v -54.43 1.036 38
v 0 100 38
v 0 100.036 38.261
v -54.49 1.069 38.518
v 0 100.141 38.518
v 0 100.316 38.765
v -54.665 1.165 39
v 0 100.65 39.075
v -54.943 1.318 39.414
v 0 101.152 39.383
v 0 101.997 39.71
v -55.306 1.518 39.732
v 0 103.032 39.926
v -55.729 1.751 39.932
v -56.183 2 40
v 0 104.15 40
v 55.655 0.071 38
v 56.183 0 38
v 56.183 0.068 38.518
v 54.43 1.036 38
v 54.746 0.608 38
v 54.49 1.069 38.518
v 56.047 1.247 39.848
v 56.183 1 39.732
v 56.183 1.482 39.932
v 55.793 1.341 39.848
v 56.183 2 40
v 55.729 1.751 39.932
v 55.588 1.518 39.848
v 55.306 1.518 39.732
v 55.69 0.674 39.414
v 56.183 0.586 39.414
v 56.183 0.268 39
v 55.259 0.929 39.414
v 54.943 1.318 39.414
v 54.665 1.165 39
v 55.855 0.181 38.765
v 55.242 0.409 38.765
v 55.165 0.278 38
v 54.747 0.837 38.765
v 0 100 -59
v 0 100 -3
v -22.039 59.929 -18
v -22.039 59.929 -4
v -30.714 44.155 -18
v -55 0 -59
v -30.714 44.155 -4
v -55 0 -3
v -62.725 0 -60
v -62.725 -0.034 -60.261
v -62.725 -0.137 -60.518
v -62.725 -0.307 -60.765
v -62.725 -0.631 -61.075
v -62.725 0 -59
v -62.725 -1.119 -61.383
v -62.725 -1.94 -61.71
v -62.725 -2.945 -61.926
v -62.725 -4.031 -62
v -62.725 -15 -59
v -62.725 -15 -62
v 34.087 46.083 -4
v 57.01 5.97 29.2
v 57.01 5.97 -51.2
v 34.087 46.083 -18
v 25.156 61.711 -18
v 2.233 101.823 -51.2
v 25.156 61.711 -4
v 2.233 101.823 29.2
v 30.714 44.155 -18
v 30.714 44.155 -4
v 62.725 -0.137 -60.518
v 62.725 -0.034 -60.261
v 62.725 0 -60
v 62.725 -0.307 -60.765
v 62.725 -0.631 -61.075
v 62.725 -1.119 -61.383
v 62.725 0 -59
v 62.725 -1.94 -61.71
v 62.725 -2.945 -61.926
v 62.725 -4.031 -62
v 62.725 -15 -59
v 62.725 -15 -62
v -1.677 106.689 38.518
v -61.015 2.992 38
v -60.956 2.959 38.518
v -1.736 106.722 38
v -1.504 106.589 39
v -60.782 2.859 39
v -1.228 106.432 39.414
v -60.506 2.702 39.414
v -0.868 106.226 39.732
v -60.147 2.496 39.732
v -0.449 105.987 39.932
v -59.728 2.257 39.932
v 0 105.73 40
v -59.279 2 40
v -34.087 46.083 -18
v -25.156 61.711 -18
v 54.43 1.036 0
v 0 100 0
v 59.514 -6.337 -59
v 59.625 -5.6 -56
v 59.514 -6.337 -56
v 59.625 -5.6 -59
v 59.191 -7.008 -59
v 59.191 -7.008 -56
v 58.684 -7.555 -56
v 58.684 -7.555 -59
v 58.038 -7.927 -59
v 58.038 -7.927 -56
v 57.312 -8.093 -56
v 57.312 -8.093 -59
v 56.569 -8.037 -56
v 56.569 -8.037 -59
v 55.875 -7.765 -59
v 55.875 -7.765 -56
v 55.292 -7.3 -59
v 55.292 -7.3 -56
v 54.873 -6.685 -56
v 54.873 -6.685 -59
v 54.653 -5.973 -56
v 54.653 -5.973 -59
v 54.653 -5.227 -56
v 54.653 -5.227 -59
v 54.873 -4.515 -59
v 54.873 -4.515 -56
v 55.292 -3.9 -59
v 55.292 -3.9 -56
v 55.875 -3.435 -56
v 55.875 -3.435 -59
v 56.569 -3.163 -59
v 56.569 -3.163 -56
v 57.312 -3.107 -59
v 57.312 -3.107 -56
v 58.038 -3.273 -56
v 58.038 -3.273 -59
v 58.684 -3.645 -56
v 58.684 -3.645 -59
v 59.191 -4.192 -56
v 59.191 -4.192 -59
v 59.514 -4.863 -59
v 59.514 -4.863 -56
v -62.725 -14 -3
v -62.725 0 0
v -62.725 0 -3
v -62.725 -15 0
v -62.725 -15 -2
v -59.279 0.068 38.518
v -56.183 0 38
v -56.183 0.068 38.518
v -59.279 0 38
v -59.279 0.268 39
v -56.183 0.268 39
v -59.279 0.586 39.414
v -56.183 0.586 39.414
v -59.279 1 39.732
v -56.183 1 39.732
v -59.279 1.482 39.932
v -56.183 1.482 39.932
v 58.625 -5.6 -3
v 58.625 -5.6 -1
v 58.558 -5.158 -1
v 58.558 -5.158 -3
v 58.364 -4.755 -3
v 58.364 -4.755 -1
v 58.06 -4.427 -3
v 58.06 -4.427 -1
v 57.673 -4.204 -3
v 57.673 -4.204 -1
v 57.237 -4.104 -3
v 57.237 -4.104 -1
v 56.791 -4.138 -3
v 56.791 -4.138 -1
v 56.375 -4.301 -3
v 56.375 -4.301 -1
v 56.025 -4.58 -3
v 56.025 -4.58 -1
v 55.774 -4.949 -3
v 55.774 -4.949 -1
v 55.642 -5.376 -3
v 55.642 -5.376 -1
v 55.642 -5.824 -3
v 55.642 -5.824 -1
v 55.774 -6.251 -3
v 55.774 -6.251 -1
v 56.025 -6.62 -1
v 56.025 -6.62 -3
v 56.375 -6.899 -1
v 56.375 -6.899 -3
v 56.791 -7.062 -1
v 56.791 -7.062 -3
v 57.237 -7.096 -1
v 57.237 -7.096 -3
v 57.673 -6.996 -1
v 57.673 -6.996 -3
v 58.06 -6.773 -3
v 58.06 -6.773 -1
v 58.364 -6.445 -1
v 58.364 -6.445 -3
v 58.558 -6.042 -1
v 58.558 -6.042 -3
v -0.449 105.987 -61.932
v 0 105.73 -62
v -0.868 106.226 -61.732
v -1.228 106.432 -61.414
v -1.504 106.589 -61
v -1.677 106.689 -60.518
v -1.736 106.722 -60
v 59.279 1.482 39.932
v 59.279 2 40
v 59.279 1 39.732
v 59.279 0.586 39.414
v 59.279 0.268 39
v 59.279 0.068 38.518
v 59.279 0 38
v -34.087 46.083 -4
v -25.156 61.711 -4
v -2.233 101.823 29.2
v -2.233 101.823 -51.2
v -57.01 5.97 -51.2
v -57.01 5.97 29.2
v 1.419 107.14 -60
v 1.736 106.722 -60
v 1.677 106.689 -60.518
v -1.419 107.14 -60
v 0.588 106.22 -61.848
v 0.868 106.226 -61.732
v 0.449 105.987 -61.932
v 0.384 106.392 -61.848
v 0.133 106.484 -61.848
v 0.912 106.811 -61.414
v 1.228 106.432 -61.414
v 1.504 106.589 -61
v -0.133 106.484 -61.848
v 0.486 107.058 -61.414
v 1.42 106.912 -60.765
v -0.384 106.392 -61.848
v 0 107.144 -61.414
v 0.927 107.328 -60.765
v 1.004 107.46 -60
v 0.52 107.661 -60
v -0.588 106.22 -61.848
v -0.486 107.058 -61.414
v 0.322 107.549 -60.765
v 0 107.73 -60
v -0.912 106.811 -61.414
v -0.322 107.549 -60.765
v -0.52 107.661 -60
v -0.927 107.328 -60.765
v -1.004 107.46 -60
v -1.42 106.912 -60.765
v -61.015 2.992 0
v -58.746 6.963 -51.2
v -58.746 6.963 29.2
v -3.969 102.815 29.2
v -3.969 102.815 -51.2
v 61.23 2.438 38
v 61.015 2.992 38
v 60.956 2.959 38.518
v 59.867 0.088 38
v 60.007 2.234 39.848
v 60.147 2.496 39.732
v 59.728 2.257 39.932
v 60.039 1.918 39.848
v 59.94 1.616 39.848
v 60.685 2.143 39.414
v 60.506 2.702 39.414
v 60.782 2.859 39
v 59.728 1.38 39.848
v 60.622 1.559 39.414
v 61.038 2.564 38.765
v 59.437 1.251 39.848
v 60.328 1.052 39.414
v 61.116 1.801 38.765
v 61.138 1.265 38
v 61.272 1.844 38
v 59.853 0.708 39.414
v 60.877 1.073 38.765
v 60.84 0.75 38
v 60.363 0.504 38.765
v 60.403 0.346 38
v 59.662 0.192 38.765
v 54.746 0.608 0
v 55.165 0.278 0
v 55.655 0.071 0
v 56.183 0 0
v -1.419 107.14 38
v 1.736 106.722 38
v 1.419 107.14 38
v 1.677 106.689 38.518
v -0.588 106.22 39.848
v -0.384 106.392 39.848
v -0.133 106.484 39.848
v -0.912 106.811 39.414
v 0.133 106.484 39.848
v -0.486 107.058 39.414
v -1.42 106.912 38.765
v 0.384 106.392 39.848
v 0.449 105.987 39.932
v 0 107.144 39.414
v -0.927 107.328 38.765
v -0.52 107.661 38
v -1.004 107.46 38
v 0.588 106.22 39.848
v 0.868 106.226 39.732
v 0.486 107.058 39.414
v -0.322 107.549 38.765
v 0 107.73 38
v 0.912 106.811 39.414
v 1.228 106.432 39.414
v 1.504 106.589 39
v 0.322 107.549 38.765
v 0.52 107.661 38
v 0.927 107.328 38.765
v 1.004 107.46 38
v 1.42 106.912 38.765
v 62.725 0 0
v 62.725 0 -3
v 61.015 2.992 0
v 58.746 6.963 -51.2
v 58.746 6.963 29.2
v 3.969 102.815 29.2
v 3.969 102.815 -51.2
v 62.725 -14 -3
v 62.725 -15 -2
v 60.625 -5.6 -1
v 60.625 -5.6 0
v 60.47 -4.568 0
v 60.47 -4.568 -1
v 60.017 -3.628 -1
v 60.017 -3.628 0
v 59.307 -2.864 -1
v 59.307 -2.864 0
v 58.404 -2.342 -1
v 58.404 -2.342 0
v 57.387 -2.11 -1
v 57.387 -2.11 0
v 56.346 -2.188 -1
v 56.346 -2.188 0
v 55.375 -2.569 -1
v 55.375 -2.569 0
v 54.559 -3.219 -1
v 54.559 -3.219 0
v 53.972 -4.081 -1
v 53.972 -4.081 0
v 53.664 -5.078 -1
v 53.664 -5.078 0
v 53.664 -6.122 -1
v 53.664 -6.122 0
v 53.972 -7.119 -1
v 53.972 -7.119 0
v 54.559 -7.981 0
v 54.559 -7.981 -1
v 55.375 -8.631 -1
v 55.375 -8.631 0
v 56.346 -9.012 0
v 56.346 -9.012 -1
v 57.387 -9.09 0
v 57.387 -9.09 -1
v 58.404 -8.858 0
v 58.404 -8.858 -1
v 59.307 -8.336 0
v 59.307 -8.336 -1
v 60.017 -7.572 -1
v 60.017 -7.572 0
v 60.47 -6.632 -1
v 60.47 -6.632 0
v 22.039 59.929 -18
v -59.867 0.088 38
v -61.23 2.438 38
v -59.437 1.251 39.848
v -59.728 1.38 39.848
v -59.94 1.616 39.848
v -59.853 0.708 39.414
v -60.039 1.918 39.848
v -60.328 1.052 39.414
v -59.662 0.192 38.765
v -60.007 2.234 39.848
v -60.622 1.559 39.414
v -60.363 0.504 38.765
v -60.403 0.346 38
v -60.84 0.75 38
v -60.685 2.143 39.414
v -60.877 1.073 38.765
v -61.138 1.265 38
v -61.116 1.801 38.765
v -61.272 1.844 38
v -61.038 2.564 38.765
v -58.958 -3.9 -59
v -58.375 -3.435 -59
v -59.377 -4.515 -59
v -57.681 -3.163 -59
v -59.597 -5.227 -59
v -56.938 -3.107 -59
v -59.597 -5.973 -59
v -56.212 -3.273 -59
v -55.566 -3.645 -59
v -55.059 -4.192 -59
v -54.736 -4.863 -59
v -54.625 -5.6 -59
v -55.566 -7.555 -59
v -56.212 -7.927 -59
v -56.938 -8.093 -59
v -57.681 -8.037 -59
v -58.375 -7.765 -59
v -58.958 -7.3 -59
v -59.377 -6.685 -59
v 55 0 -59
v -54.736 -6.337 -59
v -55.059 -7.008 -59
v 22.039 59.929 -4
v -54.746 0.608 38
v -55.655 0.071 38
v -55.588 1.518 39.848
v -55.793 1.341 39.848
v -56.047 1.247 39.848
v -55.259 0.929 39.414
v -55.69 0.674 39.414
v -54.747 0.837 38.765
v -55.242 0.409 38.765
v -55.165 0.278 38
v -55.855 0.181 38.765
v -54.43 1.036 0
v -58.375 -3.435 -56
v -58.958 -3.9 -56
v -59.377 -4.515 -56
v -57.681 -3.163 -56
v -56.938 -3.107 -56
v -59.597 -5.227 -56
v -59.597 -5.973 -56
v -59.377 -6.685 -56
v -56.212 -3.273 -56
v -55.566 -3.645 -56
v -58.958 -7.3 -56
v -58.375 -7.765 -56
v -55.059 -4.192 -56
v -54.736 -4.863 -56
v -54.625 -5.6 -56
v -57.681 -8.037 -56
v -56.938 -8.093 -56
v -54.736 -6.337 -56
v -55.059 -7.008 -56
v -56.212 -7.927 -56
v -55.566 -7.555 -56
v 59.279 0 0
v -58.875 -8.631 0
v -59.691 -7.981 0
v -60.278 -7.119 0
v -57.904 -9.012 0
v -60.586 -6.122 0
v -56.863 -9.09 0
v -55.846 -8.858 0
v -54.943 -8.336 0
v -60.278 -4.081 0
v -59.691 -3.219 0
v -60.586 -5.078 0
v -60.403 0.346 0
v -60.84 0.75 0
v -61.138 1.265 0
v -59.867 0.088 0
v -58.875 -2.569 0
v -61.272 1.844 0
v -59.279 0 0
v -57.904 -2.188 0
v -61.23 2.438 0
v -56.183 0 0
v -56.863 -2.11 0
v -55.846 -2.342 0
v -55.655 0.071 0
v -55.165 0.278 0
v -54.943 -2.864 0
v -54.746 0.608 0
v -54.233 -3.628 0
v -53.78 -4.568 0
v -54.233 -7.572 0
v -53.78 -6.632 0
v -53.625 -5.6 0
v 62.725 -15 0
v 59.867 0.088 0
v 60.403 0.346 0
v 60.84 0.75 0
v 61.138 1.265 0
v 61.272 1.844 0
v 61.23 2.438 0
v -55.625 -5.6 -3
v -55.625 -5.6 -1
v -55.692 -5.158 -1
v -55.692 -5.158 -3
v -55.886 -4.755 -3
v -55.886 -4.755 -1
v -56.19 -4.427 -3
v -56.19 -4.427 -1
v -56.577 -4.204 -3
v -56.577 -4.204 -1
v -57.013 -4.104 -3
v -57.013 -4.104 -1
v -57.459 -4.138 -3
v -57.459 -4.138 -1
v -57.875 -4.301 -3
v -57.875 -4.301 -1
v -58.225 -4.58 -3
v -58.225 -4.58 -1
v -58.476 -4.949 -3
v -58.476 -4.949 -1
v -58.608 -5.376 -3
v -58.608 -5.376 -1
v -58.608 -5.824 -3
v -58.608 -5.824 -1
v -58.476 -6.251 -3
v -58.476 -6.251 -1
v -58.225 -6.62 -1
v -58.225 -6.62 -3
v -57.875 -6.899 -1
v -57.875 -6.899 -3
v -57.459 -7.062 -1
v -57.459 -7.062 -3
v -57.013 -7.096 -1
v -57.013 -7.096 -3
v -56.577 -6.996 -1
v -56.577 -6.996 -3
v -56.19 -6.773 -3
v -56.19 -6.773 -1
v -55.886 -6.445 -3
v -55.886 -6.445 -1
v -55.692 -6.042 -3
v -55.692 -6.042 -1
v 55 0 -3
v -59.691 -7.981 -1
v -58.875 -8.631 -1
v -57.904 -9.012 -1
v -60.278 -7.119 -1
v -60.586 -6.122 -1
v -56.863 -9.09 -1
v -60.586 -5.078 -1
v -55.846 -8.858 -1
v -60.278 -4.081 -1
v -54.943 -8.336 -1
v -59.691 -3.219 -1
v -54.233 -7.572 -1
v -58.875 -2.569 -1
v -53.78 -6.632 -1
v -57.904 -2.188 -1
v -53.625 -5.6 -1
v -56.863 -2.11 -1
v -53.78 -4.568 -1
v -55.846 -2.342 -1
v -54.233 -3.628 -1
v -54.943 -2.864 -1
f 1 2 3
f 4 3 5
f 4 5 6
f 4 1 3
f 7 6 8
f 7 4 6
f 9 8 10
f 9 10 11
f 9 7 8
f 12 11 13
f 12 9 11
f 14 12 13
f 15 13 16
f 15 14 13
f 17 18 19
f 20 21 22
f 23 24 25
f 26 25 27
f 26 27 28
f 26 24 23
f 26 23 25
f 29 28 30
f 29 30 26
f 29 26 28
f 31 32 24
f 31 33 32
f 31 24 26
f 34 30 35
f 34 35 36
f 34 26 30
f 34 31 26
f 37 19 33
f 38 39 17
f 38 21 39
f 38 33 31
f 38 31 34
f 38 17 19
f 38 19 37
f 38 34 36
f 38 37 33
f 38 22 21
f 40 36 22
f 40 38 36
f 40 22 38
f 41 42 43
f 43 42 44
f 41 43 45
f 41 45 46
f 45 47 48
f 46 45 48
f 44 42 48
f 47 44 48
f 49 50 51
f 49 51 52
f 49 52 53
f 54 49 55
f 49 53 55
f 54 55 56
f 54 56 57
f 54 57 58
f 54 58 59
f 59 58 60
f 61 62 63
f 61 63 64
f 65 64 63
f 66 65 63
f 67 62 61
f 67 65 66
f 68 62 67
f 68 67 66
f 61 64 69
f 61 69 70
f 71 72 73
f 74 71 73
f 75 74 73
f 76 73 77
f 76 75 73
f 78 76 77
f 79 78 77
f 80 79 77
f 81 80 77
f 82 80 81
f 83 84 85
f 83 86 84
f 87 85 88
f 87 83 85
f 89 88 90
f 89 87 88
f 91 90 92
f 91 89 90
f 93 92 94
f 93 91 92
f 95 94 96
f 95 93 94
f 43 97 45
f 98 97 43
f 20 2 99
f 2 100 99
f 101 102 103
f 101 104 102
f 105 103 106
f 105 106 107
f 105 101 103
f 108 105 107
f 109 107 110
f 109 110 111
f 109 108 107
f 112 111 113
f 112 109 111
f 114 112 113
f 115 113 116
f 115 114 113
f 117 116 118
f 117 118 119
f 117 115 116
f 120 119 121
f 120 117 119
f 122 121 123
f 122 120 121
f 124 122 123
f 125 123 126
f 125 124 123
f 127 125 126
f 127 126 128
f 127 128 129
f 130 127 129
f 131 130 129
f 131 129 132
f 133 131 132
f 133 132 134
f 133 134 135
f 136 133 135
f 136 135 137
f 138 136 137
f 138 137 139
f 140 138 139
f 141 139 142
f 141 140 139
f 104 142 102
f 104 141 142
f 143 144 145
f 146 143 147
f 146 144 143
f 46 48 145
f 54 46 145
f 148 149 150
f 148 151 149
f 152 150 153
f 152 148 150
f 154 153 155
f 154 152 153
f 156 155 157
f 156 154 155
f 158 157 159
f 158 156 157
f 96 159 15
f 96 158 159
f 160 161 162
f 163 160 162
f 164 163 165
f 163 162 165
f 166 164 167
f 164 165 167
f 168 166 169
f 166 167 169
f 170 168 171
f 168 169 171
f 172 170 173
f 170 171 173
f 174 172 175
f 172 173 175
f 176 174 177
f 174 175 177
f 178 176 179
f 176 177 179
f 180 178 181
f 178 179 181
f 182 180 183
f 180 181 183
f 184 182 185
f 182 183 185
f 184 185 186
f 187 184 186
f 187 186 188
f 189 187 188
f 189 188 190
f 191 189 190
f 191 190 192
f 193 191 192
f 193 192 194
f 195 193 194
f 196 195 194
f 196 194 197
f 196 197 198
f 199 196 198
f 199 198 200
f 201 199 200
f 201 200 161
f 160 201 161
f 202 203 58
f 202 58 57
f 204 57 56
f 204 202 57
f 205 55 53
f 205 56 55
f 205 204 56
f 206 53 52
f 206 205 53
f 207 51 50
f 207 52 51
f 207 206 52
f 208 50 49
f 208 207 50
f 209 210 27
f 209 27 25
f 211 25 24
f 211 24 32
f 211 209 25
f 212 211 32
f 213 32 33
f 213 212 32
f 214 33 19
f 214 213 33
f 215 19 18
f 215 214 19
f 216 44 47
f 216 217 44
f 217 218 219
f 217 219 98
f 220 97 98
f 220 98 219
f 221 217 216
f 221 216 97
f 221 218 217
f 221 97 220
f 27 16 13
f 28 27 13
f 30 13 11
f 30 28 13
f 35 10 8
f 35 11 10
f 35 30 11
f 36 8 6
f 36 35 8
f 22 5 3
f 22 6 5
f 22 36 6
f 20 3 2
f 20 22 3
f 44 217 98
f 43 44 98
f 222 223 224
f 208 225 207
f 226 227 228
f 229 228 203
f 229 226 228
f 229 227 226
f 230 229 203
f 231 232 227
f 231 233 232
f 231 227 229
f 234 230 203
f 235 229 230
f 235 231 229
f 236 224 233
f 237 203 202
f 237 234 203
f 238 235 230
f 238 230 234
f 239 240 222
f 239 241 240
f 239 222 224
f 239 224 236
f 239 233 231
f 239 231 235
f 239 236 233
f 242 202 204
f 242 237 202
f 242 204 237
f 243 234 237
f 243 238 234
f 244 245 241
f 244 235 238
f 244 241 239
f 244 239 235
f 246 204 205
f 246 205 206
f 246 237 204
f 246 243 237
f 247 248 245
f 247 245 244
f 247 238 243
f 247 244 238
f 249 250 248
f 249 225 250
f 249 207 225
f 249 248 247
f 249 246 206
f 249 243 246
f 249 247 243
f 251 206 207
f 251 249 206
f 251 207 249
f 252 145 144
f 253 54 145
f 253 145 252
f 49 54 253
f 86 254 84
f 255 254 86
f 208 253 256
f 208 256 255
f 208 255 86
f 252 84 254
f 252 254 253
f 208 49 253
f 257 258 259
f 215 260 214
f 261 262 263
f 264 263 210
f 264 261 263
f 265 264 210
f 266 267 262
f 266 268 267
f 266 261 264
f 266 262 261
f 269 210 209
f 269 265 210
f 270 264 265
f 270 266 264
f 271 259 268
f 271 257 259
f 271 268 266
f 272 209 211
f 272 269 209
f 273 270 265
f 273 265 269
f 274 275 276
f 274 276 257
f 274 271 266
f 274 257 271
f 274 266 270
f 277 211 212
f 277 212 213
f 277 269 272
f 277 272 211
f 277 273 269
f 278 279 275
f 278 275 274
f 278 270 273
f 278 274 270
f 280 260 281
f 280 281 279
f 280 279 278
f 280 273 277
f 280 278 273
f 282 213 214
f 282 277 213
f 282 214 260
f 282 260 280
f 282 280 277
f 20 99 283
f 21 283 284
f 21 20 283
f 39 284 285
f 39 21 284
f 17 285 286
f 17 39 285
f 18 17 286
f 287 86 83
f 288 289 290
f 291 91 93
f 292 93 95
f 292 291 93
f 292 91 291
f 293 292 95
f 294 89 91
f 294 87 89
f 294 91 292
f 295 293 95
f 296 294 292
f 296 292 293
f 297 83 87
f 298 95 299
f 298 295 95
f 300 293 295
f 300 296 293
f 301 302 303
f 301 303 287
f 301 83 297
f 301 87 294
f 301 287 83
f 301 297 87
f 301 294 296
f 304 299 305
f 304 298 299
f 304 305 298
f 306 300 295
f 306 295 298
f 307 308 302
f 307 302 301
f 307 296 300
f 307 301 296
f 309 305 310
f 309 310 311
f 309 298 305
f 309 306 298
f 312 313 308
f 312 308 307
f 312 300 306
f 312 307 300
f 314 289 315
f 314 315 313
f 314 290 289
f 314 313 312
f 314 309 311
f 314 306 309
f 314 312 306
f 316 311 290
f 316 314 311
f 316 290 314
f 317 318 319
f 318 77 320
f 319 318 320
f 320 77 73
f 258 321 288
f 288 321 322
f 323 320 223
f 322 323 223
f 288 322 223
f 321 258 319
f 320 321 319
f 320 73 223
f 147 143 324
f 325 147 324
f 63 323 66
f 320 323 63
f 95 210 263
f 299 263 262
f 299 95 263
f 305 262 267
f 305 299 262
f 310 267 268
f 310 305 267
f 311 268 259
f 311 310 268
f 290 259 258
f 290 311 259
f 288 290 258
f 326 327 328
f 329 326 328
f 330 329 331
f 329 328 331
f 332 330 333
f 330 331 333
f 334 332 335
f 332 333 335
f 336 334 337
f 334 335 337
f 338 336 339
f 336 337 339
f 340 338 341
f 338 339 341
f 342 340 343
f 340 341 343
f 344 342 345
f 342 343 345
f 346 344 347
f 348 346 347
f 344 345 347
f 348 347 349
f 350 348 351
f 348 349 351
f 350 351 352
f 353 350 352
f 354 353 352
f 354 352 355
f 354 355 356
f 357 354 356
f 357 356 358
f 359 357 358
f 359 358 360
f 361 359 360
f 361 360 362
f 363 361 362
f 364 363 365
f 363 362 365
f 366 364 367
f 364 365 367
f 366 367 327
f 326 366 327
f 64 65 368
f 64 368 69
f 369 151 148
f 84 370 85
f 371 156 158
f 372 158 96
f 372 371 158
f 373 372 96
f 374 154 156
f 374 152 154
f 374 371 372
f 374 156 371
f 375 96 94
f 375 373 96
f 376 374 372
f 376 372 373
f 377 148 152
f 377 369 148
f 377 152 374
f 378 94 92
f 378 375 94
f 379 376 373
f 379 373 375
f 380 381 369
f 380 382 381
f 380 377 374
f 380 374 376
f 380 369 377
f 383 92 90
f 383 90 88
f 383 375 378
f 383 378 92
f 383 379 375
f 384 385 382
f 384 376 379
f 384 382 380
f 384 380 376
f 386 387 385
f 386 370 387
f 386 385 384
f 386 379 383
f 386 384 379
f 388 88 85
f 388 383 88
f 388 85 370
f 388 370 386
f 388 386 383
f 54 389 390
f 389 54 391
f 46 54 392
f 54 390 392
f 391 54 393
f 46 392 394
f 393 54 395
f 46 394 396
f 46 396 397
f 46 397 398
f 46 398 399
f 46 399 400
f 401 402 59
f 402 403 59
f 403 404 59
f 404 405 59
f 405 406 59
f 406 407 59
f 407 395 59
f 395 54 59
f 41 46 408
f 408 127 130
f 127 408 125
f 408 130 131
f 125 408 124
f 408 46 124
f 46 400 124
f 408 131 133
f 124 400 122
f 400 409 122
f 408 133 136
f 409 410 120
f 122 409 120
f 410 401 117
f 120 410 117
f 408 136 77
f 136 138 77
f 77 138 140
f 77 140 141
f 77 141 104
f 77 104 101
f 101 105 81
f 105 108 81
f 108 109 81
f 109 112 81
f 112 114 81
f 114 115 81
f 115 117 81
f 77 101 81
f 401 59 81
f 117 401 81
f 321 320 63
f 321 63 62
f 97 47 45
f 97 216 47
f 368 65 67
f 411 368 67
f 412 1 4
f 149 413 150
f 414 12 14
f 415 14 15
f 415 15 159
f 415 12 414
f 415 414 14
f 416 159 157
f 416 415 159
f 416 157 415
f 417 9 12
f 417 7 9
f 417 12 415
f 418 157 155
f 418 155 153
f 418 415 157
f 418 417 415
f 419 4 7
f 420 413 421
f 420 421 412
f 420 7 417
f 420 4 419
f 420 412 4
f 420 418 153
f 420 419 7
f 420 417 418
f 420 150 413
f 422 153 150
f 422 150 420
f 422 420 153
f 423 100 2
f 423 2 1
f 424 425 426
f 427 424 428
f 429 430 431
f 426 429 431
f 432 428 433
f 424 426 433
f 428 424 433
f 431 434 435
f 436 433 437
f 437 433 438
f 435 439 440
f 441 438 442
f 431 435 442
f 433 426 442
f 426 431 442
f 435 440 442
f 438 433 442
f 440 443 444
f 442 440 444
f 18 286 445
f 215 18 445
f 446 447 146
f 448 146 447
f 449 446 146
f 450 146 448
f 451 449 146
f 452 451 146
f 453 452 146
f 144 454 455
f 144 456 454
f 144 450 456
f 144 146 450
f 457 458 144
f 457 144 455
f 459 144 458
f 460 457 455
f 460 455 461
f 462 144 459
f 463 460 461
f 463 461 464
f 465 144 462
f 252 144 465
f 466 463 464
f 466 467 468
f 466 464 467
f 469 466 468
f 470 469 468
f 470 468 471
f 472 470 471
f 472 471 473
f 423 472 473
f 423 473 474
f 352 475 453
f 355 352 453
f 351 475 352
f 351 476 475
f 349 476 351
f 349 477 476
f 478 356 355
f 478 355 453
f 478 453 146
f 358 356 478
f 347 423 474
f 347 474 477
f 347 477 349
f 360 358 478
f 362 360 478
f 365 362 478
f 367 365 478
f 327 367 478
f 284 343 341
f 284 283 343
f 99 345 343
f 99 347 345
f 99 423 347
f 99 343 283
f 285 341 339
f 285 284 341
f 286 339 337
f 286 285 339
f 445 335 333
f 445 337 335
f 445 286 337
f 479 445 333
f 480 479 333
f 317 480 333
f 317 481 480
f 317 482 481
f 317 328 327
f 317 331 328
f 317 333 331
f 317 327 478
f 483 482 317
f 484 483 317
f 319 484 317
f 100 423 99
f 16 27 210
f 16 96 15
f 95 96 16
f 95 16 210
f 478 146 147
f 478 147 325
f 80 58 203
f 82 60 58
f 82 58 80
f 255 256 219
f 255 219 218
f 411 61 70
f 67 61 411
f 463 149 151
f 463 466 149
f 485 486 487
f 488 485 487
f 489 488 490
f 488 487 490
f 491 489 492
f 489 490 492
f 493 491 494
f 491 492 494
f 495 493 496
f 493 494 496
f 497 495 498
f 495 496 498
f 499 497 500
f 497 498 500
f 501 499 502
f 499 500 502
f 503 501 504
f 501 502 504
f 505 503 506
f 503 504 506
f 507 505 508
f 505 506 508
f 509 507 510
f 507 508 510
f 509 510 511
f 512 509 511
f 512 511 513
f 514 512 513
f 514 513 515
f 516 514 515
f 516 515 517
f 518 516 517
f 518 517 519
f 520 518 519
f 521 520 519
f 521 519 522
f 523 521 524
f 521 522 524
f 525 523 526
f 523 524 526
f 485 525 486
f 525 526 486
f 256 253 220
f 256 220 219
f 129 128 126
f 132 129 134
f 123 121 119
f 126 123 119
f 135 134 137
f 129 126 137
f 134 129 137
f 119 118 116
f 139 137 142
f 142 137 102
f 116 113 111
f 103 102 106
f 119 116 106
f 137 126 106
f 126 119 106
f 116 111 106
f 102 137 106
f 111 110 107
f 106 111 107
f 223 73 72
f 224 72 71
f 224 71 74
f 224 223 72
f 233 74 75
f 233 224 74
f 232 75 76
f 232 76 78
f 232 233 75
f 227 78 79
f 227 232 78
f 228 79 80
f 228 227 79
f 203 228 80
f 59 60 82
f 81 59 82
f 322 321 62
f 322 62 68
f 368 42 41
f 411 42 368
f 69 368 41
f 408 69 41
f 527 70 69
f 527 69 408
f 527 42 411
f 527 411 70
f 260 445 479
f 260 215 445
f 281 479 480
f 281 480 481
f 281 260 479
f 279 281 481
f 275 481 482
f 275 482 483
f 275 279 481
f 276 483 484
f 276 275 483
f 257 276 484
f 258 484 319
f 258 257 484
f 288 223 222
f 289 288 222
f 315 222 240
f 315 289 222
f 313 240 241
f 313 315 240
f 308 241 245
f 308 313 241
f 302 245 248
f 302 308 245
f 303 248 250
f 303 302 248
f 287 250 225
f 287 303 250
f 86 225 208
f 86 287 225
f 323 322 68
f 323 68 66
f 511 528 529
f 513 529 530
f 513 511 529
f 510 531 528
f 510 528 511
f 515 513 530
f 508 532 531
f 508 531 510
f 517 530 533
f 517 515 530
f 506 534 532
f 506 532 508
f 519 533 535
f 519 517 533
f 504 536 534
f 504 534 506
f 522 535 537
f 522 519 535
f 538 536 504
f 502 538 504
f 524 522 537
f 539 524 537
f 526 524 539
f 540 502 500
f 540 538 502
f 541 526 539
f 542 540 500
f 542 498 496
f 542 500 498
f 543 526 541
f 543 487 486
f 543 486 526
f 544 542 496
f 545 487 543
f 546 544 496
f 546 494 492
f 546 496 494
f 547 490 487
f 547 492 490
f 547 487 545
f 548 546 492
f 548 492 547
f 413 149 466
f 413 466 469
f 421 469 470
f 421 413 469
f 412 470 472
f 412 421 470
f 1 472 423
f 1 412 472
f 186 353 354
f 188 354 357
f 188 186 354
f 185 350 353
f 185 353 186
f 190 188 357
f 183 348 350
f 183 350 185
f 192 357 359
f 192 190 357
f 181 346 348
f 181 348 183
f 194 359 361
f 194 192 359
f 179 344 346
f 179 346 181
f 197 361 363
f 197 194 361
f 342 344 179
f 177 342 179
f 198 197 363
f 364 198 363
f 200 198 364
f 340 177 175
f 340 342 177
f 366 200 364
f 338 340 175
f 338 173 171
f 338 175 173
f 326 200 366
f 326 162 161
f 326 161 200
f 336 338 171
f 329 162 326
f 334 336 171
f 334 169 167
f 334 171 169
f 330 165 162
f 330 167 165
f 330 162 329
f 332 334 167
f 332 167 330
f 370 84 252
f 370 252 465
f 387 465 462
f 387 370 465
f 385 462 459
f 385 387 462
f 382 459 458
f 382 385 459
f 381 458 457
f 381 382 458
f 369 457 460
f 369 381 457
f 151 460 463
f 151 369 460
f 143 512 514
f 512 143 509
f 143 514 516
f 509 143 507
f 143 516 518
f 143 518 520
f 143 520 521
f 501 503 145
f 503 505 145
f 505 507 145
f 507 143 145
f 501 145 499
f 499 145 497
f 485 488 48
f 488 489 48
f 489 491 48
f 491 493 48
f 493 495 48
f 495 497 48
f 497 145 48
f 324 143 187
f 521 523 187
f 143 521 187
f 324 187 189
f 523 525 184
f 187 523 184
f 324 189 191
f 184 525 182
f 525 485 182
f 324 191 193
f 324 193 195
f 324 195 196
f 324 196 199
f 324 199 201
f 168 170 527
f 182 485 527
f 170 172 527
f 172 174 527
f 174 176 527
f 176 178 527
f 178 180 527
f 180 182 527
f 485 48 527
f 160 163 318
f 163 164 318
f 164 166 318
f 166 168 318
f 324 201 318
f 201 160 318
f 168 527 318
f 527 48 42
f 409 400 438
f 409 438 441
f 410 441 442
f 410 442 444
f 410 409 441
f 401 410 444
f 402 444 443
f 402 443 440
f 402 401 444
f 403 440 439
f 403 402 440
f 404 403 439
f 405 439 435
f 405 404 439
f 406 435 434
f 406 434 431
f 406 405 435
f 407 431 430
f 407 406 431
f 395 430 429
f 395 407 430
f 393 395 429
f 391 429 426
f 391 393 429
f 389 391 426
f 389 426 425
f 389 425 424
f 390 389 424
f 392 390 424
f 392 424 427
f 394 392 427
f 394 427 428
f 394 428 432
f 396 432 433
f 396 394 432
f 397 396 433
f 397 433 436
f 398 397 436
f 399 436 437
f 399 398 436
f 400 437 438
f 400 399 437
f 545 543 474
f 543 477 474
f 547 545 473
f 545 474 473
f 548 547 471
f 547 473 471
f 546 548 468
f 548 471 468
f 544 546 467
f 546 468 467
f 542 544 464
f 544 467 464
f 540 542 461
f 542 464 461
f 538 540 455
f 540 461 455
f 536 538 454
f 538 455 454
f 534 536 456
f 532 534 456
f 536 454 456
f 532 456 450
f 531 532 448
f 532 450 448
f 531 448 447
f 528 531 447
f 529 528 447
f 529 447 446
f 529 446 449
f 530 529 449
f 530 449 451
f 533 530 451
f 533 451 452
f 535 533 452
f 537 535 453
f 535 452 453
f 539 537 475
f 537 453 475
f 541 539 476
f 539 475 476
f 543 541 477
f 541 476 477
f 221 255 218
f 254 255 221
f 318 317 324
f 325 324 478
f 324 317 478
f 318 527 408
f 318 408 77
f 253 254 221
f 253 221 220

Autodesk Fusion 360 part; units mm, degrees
sketch "Sketch1" plane through (0, 0, 0) normal (0, 0, 1) x (1, 0, 0)
  line L0 (0, 0) -> (62.725, 0)
  line L1 (0, 0) -> (-62.725, 0)
  line L2 (62.725, 0) -> (62.725, -15)
  circle A0 centre (-57.125, -5.6) radius 1.5
  line L3 (-62.725, 0) -> (-62.725, -15)
  line L4 (-62.725, -15) -> (62.725, -15)
  circle A1 centre (57.125, -5.6) radius 1.5
  line L5 (0, 0) -> (0, 109.7609) construction
  line L6 (-62.725, 0) -> (0, 109.7609)
  line L7 (62.725, 0) -> (0, 109.7609)
  line L8 (0, 109.7609) -> (0, 100)
  line L9 (0, 100) -> (-55, 0)
  line L10 (0, 100) -> (55, 0)
  circle A2 centre (-57.125, -5.6) radius 3.5
  circle A3 centre (57.125, -5.6) radius 3.5
  dimension "d1" = 62.725
  dimension "d2" = 62.725
  dimension "d3" = 15
  dimension "d8" = 3
  dimension "d9" = 15
  dimension "d12" = 3
  dimension "d33" = 2
  dimension "d34" = 2
extrude "Extrude1" add sketch "Sketch1" against normal blind 3 contours L0 L1 L2 L3 L4 | A2 | A3 makes body 1
extrude "Extrude2" add sketch "Sketch1" against normal blind 62 separate body contours L0 L7 L8 L10 | L1 L6 L8 L9 makes body 2
extrude "Extrude3" add sketch "Sketch1" against normal blind 3 contours L0 L1 L9 L10 bodies 1 2
sketch "Sketch2" plane through (0, 0, -62) normal (0, 0, -1) x (1, 0, 0)
  line L0 (0, -100) -> (-55, 0)
  line L1 (-55, 0) -> (-62.725, 0)
  line L2 (-62.725, 0) -> (0, -109.7609)
  line L3 (0, -109.7609) -> (62.725, 0)
  line L4 (55, 0) -> (0, -100)
  line L5 (0, 0) -> (-62.725, 0)
  line L6 (0, 0) -> (62.725, 0)
  line L7 (62.725, 0) -> (62.725, 15)
  line L8 (-62.725, 0) -> (-62.725, 15)
  line L9 (-62.725, 15) -> (62.725, 15)
  line L10 (62.725, 0) -> (55, 0)
  circle A0 centre (57.125, 5.6) radius 2.5
  circle A1 centre (-57.125, 5.6) radius 2.5
  dimension "d23" = 5
  dimension "d24" = 5.6
  dimension "d25" = 5.6
  dimension "d26" = 5
  dimension "d27" = 5.6
  dimension "d28" = 5.6
extrude "Extrude4" add sketch "Sketch2" against normal blind 3 separate body contours L1 L5 L6 L7 L8 L9 L10 | A0 | A1 makes body 3
extrude "Extrude5" add sketch "Sketch2" against normal blind 3 contours L0 L4 L5 L6 bodies 1 3
extrude "Extrude6" add sketch "Sketch2" against normal blind 6 contours A0 | A1 bodies 1
extrude "Extrude7" cut sketch "Sketch1" against normal blind 1 contours A2 | A3 bodies 1
chamfer "Chamfer1" distance 1 angle 45 1 edges at (0, -15, -3) on bodies 1
extrude "Extrude8" add sketch "Sketch1" along normal blind 40 contours L0 L7 L8 L10 | L1 L6 L8 L9 bodies 1
sketch "Sketch3" plane through (-47.2833, 27.021, 0) normal (-0.868228, 0.496166, 0) x (-0.496166, -0.868228, 0)
  line L0 (-95.2975, 40) -> (-95.2975, -62)
  line L1 (-95.2975, -62) -> (31.122, -62)
  line L2 (31.122, -62) -> (31.122, -59)
  line L3 (31.122, -59) -> (31.122, -3)
  line L4 (31.122, -3) -> (31.122, 0)
  line L5 (31.122, 0) -> (31.122, 40)
  line L6 (31.122, 40) -> (-95.2975, 40)
  line L7 (-87.0975, 29) -> (22.9025, 29) construction
  line L8 (22.9025, 29) -> (22.9025, -51) construction
  line L9 (22.9025, -51) -> (-87.0975, -51) construction
  line L10 (-87.0975, -51) -> (-87.0975, 29) construction
  line L11 (23.5025, -51.6) -> (-87.6975, -51.6) construction
  line L12 (-87.6975, -51.6) -> (-87.6975, 29.6) construction
  line L13 (-87.6975, 29.6) -> (23.5025, 29.6) construction
  line L14 (23.5025, 29.6) -> (23.5025, -51.6) construction
  line L15 (-54.0975, -4) -> (-10.0975, -4)
  line L16 (-10.0975, -4) -> (-10.0975, -18)
  line L17 (-10.0975, -18) -> (-54.0975, -18)
  line L18 (-54.0975, -18) -> (-54.0975, -4)
  line L19 (-87.2975, 29.2) -> (23.1025, 29.2)
  line L20 (23.1025, 29.2) -> (23.1025, -51.2)
  line L21 (23.1025, -51.2) -> (-87.2975, -51.2)
  line L22 (-87.2975, -51.2) -> (-87.2975, 29.2)
  line L23 (-41.0975, -4) -> (-41.0975, -18)
  line L24 (-23.0975, -4) -> (-23.0975, -18)
  line L25 (-23.0975, -18) -> (-41.0975, -18)
  line L26 (-23.0975, -4) -> (-41.0975, -4)
  dimension "d40" = 110
  dimension "d41" = 80
  dimension "d42" = 11
  dimension "d43" = 8.2
  dimension "d44" = -0.6
  dimension "d55" = 33
  dimension "d66" = -0.2
  dimension "d67" = 13
  dimension "d68" = 13
extrude "Extrude12" cut sketch "Sketch3" against normal blind 2 contours L15 L17 L18 L23 | L15 L17 L23 L24 L25 L26 | L15 L16 L17 L24 | L19 L20 L21 L22 bodies 1
extrude "Extrude13" cut sketch "Sketch3" against normal blind 15 contours L15 L17 L23 L24 L25 L26 bodies 1
mirror "Mirror2" about plane through (0, 0, 0) normal (1, 0, 0) of "Extrude12", "Extrude13"
fillet "Fillet2" radius 2 5 edges at (31.3625, 54.8805, 40) (-31.3625, 54.8805, 40) (0, 109.7609, -11) (31.3625, 54.8805, -62) (-31.3625, 54.8805, -62) on bodies 1
fillet "Fillet2" radius 2 8 edges at (-27.5, 50, 40) (27.5, 50, 40) (-55, 0, 20) (-62.725, 0, 20) (55, 0, 20) (62.725, 0, 20) (-58.8625, 0, 40) (58.8625, 0, 40) on bodies 1
equation "d15 = -56 mm - 6 mm"
